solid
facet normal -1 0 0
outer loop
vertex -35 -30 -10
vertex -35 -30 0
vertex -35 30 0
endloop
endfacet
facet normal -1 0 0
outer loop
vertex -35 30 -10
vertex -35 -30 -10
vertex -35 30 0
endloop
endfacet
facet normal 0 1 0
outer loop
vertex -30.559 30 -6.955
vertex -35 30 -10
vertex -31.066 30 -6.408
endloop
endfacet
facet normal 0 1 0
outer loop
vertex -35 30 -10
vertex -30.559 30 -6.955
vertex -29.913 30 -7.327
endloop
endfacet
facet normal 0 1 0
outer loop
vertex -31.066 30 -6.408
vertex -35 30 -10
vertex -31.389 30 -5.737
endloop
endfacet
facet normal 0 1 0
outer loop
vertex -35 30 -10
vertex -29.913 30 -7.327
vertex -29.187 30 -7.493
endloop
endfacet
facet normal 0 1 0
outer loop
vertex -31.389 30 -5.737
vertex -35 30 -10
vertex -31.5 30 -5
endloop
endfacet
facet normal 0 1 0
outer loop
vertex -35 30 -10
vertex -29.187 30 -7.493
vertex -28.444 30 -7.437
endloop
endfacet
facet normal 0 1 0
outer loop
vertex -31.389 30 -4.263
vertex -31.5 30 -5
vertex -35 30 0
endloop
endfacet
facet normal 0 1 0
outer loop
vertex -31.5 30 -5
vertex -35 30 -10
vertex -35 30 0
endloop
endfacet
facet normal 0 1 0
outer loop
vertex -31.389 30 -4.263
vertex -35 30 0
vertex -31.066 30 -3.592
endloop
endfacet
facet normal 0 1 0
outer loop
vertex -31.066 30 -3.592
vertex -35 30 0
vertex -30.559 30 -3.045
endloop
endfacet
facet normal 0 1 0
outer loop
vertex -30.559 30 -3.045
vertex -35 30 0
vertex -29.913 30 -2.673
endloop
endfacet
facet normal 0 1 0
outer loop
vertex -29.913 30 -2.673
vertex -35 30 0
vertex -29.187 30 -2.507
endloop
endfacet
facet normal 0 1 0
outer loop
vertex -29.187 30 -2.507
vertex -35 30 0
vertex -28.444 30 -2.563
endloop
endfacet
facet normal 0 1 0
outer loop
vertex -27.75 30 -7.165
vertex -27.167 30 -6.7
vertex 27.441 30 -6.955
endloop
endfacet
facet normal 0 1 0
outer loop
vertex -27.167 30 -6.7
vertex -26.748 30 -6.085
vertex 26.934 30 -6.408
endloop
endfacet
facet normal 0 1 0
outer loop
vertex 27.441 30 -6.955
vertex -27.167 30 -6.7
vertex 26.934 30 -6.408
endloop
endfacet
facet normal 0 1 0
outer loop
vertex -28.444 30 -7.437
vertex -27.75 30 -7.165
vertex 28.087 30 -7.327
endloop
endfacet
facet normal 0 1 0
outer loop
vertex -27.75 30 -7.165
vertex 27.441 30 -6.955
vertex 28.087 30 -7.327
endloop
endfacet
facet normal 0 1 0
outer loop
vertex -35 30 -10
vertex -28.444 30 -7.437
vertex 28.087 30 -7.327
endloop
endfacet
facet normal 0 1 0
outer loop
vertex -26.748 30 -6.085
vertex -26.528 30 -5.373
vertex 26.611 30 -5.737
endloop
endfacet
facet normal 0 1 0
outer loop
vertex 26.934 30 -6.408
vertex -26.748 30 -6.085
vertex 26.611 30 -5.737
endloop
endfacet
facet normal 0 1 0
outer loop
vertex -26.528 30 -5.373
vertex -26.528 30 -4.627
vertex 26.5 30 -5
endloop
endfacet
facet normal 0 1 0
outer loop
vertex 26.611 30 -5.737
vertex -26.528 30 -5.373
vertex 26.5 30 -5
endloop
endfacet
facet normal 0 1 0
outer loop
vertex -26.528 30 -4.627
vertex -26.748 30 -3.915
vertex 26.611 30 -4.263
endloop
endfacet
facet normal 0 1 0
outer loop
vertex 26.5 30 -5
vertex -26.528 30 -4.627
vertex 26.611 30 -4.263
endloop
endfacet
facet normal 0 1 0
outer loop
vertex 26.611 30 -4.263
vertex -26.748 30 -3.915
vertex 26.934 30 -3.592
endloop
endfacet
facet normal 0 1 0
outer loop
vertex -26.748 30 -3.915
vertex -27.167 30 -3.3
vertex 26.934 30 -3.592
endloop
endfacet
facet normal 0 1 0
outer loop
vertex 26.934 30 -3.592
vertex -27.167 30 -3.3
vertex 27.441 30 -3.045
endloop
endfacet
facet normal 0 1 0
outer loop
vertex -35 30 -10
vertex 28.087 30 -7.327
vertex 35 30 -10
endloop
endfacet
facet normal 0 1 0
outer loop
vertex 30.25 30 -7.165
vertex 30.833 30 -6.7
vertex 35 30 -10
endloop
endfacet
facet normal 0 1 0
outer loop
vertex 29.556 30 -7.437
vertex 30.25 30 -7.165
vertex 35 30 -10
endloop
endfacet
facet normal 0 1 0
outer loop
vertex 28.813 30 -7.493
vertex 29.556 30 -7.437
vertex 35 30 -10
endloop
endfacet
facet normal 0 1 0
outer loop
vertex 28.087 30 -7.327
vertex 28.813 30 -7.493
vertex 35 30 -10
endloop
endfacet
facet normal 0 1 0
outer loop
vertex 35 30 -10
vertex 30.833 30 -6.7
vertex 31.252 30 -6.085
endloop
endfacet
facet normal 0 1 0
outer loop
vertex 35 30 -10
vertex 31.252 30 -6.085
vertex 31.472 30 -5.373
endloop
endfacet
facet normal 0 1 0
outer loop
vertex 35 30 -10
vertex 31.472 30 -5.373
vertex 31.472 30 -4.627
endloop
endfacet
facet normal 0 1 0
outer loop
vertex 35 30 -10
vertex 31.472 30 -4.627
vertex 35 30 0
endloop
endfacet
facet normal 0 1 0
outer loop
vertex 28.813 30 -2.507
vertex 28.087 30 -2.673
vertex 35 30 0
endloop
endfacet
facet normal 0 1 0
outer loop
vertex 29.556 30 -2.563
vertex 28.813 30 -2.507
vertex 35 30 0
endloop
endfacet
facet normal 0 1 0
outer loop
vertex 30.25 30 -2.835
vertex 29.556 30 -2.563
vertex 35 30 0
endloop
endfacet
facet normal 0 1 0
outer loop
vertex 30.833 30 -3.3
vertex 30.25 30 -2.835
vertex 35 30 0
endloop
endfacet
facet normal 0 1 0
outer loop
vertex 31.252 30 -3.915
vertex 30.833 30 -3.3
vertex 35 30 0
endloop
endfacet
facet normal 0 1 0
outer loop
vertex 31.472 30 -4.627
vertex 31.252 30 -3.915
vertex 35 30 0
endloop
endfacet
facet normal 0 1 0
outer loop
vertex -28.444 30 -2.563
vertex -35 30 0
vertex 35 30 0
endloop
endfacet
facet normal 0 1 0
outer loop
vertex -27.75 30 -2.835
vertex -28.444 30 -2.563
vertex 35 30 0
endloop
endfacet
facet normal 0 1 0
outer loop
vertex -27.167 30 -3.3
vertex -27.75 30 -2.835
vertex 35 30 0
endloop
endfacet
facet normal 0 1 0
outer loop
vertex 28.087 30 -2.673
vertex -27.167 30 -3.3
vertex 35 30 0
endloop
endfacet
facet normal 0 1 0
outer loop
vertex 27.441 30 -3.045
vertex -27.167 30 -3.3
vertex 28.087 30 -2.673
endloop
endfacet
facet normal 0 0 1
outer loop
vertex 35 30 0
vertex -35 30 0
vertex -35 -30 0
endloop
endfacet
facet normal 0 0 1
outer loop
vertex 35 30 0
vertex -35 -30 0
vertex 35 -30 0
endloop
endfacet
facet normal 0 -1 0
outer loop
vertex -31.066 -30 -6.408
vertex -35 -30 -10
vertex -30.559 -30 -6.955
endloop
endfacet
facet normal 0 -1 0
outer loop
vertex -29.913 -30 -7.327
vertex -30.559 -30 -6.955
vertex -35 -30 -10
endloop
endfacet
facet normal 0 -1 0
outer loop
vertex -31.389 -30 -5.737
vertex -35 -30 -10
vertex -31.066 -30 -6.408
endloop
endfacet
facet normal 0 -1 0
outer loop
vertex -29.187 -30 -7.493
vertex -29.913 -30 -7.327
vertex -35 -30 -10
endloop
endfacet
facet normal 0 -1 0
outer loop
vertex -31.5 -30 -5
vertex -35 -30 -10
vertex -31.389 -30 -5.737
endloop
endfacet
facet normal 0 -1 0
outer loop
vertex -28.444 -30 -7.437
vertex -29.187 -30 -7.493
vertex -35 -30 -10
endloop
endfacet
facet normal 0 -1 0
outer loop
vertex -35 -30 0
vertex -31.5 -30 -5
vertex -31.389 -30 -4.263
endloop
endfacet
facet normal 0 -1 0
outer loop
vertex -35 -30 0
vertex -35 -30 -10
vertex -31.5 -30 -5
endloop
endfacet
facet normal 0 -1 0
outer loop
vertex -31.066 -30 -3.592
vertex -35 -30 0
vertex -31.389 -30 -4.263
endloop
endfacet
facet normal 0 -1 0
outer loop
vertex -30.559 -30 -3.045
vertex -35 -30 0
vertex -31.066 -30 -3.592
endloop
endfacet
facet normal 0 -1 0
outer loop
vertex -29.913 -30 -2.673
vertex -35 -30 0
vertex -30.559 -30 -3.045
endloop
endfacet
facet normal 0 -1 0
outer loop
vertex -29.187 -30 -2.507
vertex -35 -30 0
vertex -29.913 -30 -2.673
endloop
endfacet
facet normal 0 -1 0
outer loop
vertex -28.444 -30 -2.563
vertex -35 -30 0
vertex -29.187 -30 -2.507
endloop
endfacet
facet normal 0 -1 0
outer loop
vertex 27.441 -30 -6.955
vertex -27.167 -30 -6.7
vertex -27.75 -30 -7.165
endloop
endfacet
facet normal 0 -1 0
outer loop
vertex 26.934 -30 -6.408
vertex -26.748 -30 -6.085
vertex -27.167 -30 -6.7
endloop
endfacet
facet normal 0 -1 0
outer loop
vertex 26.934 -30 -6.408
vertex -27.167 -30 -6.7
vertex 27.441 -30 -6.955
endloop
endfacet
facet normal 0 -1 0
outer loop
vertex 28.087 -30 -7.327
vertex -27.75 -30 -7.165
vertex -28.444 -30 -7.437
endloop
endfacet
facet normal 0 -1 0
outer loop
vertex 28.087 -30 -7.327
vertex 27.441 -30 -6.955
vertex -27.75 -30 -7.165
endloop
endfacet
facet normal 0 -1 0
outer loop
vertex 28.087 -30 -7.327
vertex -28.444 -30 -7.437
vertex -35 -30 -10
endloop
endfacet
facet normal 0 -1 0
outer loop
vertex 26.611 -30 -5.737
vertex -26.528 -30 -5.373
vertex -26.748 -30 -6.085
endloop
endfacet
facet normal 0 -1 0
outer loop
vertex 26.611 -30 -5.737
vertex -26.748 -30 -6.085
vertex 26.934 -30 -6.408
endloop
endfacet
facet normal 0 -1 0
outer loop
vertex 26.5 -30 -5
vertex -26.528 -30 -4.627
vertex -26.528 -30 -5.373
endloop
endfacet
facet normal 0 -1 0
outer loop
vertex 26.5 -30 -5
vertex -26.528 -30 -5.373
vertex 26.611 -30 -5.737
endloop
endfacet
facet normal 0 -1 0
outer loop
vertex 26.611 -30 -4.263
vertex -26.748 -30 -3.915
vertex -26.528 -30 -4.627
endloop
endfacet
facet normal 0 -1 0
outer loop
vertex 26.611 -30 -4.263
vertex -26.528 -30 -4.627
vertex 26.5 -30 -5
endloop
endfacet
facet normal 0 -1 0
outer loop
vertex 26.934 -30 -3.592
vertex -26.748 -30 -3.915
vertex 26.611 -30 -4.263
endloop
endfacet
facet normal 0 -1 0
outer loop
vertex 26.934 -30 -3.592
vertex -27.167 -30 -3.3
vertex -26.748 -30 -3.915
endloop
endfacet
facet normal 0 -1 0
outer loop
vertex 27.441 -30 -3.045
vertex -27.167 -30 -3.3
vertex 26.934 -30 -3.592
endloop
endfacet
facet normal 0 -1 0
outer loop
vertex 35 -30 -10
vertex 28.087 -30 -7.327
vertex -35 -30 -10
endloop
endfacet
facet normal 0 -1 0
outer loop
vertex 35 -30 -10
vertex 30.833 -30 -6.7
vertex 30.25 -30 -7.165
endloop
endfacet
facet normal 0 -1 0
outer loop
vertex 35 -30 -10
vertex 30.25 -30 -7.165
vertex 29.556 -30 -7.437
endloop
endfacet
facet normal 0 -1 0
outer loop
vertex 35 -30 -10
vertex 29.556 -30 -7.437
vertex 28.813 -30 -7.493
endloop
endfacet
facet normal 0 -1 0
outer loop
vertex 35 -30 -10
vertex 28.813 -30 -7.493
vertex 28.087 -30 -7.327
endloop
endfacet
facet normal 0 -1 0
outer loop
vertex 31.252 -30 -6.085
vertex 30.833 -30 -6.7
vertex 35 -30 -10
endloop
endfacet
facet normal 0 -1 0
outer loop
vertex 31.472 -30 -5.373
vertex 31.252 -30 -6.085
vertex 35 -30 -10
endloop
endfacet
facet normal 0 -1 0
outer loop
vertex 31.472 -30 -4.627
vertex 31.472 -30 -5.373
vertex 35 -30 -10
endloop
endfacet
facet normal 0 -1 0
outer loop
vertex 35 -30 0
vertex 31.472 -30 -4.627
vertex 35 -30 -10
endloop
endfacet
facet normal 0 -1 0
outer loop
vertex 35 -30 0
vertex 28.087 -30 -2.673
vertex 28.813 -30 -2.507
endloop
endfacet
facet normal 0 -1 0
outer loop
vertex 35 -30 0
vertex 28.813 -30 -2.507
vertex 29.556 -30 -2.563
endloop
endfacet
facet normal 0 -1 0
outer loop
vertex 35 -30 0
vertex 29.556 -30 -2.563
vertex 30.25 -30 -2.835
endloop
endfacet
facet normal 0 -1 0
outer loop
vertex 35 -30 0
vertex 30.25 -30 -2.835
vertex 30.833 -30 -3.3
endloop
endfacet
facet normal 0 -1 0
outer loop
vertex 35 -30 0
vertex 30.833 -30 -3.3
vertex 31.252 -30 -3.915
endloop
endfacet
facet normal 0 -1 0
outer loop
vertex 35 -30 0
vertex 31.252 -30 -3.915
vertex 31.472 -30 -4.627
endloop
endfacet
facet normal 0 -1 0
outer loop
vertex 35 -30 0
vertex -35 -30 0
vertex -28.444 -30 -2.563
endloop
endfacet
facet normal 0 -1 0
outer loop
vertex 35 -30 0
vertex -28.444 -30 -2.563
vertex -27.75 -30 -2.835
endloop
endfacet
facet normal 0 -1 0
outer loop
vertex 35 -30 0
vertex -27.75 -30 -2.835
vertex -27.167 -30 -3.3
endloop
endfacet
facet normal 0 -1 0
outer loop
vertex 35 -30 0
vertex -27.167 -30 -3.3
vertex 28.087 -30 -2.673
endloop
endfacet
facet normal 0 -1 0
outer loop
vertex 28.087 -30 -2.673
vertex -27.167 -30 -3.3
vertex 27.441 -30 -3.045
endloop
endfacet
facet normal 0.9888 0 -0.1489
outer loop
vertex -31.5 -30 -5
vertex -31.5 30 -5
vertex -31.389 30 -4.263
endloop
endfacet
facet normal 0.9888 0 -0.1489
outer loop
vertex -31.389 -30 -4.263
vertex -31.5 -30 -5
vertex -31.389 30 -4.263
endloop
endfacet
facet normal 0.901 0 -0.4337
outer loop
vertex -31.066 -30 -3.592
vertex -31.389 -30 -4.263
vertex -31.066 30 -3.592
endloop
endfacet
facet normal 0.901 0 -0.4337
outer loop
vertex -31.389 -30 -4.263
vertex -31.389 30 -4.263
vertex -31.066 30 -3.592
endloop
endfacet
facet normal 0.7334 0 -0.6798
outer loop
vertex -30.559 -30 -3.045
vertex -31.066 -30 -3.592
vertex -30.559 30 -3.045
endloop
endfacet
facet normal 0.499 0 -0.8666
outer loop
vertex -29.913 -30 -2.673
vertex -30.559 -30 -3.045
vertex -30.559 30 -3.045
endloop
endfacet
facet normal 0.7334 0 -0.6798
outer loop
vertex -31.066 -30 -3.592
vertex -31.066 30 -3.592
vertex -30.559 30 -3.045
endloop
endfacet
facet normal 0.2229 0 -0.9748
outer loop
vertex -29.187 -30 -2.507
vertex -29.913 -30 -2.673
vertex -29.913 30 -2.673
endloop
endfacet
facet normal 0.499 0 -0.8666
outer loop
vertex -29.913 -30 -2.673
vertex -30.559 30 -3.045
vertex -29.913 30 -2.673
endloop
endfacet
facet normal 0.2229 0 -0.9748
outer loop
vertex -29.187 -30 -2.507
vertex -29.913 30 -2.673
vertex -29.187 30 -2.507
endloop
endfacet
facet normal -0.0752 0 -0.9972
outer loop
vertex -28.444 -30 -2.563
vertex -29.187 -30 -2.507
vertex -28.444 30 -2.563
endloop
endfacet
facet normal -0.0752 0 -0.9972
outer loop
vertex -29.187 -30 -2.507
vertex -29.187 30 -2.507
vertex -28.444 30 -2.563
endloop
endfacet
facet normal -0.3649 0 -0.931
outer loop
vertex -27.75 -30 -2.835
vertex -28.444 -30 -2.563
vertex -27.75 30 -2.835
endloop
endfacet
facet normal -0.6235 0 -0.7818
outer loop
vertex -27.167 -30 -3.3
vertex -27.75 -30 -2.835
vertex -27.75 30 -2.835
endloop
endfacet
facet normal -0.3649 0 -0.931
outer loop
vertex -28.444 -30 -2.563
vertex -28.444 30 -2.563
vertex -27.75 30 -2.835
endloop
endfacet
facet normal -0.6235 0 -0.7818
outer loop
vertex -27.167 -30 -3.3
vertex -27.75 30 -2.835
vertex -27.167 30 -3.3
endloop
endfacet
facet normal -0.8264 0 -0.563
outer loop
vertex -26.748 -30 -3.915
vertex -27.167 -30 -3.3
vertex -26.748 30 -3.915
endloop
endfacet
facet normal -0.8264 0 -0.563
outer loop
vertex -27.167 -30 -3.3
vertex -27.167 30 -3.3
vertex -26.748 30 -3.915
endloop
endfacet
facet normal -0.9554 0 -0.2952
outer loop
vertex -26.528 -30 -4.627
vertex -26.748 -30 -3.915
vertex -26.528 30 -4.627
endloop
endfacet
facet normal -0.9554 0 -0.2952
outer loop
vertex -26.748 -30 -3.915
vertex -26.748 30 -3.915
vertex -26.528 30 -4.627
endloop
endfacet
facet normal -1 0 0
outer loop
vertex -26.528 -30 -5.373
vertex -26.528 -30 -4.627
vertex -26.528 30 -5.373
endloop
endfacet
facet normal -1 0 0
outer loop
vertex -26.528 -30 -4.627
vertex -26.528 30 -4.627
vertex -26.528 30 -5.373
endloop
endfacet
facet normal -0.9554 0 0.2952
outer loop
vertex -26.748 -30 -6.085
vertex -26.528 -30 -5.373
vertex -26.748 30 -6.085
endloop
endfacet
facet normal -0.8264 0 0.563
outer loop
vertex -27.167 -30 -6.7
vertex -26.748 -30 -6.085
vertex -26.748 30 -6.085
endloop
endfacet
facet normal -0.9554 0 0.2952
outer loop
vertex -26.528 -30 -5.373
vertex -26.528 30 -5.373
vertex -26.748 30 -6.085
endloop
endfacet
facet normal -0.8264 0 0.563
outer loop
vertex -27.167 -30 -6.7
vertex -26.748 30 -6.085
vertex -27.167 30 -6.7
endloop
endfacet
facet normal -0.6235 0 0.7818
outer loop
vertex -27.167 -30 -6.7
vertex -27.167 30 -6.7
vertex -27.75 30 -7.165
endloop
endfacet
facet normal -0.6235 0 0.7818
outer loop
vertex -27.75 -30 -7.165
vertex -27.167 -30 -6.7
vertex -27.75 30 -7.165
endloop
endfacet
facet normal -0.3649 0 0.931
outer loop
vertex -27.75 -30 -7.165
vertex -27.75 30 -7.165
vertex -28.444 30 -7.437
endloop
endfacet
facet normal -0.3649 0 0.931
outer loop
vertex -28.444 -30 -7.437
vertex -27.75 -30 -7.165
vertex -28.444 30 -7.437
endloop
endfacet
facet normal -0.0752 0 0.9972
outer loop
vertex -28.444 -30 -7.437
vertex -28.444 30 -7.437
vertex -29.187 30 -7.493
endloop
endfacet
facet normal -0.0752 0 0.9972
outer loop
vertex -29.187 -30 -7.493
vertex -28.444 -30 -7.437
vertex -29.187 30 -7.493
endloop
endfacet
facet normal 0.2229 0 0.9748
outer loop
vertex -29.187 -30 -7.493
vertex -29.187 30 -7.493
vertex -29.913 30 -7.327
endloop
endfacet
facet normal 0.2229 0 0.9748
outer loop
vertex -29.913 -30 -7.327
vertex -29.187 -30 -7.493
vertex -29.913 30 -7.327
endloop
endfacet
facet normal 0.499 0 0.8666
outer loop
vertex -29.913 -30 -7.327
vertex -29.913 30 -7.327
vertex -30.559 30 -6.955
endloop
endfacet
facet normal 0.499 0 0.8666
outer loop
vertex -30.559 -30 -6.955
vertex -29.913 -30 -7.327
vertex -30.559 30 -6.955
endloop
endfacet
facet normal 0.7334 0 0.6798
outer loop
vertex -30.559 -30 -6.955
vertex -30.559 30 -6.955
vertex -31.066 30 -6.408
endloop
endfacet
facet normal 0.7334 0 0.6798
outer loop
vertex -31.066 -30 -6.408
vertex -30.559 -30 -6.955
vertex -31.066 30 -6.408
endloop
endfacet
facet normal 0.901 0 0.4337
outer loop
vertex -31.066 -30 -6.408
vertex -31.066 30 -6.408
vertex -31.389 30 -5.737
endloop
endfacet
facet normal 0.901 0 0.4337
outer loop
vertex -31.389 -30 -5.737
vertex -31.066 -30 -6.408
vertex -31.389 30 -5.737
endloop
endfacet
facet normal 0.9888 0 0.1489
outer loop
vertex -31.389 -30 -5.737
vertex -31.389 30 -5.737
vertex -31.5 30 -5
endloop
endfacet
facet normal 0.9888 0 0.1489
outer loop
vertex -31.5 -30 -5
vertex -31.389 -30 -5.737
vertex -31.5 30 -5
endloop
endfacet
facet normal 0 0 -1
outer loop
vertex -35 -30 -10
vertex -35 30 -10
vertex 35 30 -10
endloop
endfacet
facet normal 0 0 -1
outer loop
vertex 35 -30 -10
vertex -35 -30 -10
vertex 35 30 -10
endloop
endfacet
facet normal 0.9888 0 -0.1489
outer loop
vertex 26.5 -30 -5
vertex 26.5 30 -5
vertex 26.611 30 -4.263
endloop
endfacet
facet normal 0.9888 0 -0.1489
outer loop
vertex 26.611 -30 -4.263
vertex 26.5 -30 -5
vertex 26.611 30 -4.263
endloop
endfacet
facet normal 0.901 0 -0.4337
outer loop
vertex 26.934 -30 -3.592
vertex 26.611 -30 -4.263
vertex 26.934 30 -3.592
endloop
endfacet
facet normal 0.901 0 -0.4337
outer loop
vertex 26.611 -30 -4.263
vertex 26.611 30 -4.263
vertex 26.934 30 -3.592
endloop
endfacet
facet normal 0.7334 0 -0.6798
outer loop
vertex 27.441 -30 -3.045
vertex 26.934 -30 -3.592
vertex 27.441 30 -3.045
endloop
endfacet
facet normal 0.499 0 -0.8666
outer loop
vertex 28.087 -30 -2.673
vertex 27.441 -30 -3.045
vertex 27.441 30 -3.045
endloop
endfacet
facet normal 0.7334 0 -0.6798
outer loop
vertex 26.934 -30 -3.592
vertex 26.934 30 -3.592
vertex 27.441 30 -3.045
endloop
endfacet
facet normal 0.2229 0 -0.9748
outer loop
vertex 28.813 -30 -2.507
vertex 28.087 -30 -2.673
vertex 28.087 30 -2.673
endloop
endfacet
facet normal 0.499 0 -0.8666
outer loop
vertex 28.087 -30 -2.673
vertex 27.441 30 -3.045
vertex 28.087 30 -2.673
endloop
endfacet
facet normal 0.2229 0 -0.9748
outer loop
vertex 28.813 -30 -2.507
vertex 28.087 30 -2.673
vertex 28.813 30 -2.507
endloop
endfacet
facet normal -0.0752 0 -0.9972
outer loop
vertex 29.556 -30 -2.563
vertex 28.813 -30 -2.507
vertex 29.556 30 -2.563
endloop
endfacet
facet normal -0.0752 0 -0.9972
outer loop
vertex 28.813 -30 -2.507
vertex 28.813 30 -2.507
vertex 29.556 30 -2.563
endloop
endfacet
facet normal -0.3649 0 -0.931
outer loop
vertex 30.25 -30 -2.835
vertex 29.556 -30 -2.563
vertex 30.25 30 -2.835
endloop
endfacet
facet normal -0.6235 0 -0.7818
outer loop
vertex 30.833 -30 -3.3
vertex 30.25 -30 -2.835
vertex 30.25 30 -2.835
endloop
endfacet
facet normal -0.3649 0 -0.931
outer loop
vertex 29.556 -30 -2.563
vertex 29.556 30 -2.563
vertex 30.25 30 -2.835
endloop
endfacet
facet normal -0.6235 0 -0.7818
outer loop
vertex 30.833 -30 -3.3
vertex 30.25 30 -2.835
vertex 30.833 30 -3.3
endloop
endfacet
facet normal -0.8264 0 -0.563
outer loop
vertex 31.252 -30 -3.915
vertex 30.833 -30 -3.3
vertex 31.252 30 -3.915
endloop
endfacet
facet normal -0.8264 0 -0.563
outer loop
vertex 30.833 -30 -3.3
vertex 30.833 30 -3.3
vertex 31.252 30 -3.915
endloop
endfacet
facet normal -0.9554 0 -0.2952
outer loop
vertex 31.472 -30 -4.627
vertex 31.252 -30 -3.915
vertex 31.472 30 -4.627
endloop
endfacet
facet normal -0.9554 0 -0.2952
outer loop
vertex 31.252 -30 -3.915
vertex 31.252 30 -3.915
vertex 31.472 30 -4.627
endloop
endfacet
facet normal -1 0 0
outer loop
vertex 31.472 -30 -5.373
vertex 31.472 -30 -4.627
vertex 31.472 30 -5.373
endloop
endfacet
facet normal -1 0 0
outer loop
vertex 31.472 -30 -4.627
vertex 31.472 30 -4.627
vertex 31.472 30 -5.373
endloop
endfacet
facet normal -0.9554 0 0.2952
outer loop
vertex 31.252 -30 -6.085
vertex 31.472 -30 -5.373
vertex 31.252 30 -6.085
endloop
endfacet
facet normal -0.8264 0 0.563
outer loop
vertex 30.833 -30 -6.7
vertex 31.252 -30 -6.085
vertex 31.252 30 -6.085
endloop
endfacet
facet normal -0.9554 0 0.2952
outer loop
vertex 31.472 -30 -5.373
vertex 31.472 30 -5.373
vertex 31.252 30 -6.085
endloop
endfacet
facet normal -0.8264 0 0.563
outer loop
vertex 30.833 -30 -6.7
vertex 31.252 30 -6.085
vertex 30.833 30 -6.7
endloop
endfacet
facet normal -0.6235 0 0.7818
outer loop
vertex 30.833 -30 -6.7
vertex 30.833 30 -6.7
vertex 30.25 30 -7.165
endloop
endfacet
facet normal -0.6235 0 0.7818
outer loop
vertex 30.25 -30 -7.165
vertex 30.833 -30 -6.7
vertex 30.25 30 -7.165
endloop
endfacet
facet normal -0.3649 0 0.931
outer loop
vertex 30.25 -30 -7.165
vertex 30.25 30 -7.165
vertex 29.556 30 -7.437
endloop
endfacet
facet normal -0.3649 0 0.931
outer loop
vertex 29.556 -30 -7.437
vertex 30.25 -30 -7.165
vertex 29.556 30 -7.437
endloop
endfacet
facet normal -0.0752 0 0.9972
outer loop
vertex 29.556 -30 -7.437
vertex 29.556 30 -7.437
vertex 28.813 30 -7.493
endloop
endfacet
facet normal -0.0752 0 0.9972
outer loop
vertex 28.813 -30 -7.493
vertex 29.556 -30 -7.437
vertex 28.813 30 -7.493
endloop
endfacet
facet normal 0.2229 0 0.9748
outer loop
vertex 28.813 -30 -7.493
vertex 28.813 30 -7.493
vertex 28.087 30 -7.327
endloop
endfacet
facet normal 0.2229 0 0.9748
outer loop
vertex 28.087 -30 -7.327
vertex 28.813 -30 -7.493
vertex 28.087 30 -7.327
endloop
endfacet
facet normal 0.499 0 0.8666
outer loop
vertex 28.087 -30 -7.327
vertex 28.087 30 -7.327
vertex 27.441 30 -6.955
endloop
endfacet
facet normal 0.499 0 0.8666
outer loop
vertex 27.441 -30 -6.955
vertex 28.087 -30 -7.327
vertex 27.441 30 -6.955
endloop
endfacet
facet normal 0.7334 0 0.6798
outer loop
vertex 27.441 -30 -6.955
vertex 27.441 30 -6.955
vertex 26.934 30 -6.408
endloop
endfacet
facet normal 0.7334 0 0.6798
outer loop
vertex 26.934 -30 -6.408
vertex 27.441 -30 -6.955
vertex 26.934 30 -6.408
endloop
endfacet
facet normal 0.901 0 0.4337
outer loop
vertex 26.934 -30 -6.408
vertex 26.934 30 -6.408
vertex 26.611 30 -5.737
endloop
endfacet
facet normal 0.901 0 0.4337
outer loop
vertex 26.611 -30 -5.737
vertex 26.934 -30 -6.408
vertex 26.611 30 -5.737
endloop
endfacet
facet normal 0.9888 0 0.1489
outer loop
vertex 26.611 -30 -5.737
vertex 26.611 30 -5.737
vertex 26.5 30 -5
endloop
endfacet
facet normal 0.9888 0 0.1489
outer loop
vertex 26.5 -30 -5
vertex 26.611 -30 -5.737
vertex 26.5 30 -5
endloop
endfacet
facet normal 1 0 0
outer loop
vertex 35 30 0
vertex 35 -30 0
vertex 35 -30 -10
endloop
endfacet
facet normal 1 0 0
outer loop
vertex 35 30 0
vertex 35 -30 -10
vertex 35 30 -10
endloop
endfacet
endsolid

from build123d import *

# Parameters (mm, degrees)
SKETCH1_W           = 70
SKETCH1_H           = 60
BOSS_EXTRUDE1_DEPTH = 10
SKETCH3_R           = 2.5
CUT_EXTRUDE1_DEPTH  = 71.178344238


with BuildPart() as part:
    # Sketch1 → Boss-Extrude1 (new body)
    with BuildSketch(Plane.XY):
        Rectangle(SKETCH1_W, SKETCH1_H)
    extrude(amount=-BOSS_EXTRUDE1_DEPTH)

    # Sketch3 → Cut-Extrude1 (cut, through all)
    with BuildSketch(Plane(origin=(0, 30, 0), x_dir=(1, 0, 0), z_dir=(0, 1, 0))):
        with Locations(Location((-29, 5, 0), (0, 0, 180))):
            Circle(SKETCH3_R)
        with Locations(Location((29, 5, 0), (0, 0, 180))):
            Circle(SKETCH3_R)
    extrude(amount=-CUT_EXTRUDE1_DEPTH, mode=Mode.SUBTRACT)


solid = part.part
